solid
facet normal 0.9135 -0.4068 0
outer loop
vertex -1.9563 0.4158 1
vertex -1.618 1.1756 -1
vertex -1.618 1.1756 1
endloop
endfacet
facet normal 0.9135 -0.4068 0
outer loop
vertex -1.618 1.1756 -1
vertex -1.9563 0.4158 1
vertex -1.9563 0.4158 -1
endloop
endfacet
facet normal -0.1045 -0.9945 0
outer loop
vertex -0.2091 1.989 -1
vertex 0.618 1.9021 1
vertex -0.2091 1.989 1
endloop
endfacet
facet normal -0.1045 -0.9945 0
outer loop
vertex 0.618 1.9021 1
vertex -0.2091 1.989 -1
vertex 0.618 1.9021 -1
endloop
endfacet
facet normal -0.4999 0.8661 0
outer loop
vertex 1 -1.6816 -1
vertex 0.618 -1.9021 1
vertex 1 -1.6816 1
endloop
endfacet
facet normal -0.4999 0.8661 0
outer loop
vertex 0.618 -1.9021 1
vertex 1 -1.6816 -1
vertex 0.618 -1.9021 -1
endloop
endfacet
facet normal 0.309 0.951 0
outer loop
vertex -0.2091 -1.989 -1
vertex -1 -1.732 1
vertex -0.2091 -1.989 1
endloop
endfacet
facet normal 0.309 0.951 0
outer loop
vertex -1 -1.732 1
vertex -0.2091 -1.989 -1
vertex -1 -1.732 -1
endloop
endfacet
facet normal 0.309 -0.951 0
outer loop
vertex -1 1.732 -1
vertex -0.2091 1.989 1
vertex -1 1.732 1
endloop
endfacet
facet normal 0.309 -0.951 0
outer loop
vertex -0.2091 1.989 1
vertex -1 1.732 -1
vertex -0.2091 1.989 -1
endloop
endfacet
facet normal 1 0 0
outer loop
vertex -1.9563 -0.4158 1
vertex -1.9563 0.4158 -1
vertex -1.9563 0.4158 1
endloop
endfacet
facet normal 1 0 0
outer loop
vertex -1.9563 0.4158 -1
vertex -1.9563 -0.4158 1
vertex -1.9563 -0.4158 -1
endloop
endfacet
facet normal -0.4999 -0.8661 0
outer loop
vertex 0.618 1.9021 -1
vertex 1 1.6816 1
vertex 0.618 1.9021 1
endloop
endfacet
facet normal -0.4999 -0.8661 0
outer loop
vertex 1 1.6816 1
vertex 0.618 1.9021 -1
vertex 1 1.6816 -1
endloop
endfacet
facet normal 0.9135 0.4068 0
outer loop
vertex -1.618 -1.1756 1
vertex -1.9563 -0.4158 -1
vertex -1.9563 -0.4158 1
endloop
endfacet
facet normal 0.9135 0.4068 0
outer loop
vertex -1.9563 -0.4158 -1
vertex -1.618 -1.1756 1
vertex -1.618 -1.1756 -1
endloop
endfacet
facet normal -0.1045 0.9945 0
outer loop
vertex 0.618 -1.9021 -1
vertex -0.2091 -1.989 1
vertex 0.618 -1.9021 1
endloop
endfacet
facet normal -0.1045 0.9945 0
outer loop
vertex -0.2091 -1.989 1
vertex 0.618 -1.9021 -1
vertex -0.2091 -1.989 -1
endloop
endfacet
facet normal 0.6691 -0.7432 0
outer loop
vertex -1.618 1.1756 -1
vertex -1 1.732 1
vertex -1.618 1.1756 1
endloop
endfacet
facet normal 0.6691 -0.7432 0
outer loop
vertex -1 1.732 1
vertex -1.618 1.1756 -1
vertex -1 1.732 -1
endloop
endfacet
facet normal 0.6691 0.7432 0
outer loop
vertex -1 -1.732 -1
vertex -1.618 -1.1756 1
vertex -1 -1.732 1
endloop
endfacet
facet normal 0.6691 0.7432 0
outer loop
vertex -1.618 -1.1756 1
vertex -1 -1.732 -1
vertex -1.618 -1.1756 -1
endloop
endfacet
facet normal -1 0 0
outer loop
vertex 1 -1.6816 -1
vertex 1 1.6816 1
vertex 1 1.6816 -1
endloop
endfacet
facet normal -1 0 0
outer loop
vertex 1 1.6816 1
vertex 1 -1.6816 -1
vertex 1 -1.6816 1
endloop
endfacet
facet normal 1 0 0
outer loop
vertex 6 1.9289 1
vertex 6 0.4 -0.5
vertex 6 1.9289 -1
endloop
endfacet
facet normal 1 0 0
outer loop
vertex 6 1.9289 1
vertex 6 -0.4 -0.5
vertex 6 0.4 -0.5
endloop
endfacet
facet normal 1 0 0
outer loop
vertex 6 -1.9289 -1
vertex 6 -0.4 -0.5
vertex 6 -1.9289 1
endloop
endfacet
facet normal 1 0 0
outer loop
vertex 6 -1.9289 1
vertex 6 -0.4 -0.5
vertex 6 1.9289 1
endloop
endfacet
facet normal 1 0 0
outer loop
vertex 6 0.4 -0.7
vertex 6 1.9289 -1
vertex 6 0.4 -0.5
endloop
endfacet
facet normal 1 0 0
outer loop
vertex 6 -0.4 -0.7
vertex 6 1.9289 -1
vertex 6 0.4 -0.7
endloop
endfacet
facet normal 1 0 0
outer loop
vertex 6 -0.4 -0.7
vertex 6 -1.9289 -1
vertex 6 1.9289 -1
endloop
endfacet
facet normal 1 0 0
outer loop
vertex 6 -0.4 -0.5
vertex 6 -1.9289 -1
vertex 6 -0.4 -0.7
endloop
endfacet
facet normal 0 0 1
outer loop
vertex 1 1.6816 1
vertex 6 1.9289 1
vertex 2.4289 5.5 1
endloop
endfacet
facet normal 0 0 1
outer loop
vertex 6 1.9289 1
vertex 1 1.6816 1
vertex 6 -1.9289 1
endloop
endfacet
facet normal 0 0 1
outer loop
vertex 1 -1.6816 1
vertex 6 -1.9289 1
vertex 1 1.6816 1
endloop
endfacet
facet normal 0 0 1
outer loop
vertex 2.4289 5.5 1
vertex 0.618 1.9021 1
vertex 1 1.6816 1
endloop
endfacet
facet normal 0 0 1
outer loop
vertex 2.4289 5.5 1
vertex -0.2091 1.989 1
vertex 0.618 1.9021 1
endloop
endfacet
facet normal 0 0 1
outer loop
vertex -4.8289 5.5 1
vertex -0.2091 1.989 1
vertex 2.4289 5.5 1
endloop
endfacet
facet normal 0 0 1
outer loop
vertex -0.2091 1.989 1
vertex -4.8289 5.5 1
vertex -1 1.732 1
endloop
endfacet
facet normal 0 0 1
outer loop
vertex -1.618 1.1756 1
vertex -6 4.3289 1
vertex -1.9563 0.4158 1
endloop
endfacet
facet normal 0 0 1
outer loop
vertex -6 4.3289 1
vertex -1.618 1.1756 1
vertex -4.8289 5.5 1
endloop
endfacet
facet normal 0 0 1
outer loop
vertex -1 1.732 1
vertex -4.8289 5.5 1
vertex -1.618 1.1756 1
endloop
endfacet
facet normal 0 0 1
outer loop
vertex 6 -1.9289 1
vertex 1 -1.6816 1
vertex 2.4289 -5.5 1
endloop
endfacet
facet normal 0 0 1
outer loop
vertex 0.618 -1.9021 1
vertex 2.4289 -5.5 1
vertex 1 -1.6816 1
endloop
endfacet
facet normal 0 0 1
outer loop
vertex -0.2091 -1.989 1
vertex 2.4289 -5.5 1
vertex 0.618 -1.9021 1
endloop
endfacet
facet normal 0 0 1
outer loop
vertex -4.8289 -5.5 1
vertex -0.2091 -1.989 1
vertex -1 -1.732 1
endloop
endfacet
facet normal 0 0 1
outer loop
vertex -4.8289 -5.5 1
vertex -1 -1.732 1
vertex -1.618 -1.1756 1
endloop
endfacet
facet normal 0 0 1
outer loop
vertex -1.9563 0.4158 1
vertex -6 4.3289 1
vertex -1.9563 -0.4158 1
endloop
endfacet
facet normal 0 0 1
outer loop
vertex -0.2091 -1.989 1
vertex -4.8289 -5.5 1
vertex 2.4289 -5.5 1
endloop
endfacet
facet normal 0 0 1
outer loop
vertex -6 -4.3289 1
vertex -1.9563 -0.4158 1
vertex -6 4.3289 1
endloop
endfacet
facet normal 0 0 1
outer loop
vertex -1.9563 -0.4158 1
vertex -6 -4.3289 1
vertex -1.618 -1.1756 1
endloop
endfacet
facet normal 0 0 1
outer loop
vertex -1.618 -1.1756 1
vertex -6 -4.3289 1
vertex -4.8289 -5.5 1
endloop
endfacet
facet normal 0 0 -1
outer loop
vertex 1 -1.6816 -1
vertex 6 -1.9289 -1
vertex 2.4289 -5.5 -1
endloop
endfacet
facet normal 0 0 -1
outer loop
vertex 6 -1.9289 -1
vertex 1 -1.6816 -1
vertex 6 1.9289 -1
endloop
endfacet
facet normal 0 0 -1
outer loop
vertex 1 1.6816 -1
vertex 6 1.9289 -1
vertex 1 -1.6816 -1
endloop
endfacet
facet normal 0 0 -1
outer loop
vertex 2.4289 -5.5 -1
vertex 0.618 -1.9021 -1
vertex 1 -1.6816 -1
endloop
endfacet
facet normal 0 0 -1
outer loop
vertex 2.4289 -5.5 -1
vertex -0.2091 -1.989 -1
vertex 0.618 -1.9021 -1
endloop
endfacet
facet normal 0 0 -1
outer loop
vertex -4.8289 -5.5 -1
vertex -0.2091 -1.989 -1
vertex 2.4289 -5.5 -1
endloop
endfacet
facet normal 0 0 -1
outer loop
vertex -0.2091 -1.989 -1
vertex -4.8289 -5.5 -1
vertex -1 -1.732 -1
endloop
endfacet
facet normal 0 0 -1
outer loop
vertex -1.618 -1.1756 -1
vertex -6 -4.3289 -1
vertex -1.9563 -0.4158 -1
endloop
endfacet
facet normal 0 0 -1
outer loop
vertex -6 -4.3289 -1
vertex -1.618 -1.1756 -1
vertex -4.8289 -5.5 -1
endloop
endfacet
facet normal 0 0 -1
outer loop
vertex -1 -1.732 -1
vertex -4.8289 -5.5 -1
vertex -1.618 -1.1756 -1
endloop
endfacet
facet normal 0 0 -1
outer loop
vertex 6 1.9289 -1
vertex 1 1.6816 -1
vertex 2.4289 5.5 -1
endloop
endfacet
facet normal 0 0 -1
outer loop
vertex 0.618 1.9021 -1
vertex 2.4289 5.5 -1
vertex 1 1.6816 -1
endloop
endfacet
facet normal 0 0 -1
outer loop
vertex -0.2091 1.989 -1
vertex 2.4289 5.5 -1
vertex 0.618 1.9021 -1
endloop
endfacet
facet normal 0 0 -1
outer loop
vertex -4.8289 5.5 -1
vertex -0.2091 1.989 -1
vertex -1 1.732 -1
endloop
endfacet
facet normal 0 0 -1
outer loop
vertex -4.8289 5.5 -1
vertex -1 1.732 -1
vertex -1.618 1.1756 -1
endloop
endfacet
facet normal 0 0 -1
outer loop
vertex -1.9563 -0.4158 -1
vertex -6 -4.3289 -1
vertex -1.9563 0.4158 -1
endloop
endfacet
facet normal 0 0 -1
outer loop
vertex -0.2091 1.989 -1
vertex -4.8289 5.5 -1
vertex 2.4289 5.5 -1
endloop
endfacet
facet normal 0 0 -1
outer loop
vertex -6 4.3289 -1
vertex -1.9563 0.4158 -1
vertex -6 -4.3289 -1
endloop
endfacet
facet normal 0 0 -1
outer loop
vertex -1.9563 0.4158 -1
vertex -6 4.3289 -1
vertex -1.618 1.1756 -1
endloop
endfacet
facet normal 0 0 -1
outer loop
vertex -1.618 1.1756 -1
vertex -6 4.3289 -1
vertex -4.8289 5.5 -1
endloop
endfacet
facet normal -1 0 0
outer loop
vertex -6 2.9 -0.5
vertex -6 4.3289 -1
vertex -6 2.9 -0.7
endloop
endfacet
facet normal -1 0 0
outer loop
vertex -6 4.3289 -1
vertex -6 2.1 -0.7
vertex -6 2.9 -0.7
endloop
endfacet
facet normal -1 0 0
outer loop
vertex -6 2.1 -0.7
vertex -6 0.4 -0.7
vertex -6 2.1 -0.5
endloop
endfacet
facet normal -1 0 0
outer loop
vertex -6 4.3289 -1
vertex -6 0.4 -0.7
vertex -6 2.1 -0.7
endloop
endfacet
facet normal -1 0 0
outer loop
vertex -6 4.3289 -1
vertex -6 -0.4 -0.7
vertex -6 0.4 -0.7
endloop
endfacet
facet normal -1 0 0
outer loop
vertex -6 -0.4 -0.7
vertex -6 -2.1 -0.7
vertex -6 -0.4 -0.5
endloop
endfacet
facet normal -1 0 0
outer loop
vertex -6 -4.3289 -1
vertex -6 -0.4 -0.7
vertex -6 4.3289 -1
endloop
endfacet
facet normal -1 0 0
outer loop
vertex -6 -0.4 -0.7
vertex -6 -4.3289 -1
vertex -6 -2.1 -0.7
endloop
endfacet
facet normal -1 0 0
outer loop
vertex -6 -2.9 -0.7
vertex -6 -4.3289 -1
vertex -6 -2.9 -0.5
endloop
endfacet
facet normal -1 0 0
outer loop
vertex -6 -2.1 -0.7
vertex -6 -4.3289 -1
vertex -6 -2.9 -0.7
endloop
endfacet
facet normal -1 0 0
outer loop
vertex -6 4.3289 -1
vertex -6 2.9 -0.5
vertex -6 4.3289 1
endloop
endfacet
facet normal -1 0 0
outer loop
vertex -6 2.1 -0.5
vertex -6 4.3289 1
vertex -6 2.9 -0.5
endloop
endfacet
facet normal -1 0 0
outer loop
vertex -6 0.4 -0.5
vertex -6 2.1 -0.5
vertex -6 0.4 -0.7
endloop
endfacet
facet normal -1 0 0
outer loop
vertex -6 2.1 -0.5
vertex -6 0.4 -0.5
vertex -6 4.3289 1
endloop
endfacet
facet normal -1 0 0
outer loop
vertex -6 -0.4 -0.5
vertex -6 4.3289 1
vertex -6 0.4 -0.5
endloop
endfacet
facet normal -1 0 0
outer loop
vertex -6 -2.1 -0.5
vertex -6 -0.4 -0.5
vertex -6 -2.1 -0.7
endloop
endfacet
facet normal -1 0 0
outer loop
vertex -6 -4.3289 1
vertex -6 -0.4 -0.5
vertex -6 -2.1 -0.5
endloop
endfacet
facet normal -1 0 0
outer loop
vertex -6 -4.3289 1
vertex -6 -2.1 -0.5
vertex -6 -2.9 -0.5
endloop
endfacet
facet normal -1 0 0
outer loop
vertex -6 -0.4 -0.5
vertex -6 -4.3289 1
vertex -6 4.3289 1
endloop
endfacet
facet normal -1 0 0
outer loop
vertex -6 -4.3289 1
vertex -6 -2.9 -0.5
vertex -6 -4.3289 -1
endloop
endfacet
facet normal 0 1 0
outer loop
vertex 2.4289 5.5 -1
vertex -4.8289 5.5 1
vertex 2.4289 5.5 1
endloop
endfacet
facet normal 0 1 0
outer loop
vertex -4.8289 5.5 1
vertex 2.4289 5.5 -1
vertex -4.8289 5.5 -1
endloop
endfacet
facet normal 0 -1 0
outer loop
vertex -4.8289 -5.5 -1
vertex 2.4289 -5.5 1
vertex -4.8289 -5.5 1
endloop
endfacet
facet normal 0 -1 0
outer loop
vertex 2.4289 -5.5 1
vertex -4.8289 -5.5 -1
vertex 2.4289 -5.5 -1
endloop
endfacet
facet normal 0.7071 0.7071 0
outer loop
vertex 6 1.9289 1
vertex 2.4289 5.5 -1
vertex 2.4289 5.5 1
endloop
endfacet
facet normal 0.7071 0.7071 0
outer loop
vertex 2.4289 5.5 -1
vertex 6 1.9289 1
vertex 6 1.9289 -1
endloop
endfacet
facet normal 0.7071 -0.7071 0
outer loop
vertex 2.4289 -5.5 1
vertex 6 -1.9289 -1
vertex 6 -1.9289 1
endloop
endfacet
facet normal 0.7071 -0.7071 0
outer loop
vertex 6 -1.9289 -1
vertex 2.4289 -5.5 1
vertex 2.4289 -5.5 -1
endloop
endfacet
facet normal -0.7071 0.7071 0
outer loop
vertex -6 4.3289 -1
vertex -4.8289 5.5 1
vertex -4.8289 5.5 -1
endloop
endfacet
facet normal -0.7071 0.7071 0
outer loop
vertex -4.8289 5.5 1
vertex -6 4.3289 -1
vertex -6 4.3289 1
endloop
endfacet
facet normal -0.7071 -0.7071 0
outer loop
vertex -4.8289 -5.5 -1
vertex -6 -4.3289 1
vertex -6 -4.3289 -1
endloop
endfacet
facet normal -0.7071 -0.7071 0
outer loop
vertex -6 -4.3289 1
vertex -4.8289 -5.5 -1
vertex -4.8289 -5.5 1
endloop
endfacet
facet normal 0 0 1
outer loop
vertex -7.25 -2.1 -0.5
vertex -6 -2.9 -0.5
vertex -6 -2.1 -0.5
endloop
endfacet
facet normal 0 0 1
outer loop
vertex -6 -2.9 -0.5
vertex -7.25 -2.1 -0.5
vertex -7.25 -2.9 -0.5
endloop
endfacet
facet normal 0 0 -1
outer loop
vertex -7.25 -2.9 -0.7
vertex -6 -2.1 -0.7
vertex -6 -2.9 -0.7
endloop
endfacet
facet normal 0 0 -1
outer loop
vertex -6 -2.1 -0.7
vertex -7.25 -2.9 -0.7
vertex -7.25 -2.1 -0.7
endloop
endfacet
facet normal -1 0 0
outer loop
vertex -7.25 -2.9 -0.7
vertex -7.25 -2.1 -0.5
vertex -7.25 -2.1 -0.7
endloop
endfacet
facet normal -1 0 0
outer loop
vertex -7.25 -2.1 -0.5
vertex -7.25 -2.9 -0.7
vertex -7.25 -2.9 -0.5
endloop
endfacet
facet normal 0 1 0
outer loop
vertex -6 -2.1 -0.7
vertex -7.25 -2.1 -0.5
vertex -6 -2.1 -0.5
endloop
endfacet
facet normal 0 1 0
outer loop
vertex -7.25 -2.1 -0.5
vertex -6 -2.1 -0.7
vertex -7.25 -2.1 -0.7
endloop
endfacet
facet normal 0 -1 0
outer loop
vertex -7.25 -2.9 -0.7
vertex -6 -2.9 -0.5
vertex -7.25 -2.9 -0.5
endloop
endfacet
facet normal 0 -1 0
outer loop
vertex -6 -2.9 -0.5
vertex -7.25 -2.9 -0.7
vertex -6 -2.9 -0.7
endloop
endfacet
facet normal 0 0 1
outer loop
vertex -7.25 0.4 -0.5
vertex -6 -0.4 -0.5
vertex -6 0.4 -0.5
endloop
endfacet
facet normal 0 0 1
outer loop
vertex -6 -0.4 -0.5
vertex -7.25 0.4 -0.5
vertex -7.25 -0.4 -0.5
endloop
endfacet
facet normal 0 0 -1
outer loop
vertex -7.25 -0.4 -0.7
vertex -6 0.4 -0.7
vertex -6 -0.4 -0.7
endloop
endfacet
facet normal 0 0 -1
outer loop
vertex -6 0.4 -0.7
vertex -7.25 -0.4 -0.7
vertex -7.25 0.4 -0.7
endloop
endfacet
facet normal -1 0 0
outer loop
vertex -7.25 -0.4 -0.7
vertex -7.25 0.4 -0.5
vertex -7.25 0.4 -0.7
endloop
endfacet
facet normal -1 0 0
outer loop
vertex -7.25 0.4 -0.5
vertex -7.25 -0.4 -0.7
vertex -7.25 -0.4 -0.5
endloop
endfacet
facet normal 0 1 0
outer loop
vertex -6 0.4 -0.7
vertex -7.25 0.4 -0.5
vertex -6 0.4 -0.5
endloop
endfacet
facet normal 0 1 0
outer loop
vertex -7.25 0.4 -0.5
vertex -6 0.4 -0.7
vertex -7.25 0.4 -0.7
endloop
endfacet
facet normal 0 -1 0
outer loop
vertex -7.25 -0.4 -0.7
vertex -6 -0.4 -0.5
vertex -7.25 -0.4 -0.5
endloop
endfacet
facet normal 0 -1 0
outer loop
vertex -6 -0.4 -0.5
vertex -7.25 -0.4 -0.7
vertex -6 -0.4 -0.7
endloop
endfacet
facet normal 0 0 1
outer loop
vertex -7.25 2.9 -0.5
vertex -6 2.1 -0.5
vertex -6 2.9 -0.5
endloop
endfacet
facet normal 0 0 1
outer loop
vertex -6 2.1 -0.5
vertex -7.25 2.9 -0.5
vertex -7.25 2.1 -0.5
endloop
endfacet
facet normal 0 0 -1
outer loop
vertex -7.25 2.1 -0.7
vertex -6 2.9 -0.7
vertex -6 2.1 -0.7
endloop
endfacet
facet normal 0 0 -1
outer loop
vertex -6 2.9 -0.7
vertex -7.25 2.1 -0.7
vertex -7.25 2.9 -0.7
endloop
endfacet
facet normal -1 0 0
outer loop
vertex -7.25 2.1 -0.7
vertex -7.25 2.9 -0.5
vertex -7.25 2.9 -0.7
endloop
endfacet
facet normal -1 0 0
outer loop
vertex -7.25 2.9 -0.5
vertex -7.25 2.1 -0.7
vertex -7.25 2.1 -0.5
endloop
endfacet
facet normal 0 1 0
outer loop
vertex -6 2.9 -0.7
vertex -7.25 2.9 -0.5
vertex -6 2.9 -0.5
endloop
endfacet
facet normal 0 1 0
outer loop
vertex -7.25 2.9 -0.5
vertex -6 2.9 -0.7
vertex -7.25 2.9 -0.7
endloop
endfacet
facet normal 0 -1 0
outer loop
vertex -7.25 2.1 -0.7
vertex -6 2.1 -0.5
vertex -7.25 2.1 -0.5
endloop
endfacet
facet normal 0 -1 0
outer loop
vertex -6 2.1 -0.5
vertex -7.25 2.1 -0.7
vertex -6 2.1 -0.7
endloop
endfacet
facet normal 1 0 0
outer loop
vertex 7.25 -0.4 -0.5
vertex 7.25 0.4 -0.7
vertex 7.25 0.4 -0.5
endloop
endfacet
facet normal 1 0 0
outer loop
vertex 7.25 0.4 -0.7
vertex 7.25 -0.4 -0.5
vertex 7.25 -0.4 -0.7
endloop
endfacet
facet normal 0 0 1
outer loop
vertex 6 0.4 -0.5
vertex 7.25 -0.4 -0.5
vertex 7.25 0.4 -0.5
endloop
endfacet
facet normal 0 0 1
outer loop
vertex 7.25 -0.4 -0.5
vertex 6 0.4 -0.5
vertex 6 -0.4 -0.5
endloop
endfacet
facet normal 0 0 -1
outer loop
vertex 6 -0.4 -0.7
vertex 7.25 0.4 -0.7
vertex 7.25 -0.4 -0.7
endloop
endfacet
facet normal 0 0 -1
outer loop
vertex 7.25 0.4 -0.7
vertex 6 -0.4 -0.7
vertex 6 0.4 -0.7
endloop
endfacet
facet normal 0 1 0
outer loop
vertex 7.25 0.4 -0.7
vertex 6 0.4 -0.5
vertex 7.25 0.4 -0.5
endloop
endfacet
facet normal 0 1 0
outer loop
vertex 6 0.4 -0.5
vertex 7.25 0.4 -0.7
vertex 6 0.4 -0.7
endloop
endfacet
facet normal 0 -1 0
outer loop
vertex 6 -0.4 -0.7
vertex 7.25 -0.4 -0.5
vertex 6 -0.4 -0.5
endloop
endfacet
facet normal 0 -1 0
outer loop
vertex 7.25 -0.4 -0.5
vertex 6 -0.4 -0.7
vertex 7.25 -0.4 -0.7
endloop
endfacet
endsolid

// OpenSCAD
rotationSensor();

module rotationSensor(){
	//Digi-Key Part Number: 490-2400-ND
	//Manufacturer Part Number: SV01A103AEA01B00
	
	difference()
	{
		cube ([12, 11, 2], center = true);
		
		//translate([0.5, 0, 0]) 
		difference() 
		{
			cylinder(h = 5, d1 = 4, d2 = 4, center = true, $fn = 15);
			translate([3, 0, 0]) cube([4, 4, 4], center = true);
		}
		
		translate([7.5, 7.5, 0])
		rotate([0, 0, 45]) 
			cube([10, 10, 5], center = true);
		
		translate([7.5, -7.5, 0])
		rotate([0, 0, -45]) 
			cube([10, 10, 5], center = true);
		
		translate([-8.7, 8.7, 0])
		rotate([0, 0, 45]) 
			cube([10, 10, 5], center = true);
		
		translate([-8.7, -8.7, 0])
		rotate([0, 0, -45]) 
			cube([10, 10, 5], center = true);				
	}
	
	translate([-6.5, -2.5, -0.6])
		cube([1.5, 0.8, 0.2], center = true);
		
	translate([-6.5, 0, -0.6])
		cube([1.5, 0.8, 0.2], center = true);		
		
	translate([-6.5, 2.5, -0.6])
		cube([1.5, 0.8, 0.2], center = true);		
		
	translate([6.5, 0, -0.6])
		cube([1.5, 0.8, 0.2], center = true);				
}
